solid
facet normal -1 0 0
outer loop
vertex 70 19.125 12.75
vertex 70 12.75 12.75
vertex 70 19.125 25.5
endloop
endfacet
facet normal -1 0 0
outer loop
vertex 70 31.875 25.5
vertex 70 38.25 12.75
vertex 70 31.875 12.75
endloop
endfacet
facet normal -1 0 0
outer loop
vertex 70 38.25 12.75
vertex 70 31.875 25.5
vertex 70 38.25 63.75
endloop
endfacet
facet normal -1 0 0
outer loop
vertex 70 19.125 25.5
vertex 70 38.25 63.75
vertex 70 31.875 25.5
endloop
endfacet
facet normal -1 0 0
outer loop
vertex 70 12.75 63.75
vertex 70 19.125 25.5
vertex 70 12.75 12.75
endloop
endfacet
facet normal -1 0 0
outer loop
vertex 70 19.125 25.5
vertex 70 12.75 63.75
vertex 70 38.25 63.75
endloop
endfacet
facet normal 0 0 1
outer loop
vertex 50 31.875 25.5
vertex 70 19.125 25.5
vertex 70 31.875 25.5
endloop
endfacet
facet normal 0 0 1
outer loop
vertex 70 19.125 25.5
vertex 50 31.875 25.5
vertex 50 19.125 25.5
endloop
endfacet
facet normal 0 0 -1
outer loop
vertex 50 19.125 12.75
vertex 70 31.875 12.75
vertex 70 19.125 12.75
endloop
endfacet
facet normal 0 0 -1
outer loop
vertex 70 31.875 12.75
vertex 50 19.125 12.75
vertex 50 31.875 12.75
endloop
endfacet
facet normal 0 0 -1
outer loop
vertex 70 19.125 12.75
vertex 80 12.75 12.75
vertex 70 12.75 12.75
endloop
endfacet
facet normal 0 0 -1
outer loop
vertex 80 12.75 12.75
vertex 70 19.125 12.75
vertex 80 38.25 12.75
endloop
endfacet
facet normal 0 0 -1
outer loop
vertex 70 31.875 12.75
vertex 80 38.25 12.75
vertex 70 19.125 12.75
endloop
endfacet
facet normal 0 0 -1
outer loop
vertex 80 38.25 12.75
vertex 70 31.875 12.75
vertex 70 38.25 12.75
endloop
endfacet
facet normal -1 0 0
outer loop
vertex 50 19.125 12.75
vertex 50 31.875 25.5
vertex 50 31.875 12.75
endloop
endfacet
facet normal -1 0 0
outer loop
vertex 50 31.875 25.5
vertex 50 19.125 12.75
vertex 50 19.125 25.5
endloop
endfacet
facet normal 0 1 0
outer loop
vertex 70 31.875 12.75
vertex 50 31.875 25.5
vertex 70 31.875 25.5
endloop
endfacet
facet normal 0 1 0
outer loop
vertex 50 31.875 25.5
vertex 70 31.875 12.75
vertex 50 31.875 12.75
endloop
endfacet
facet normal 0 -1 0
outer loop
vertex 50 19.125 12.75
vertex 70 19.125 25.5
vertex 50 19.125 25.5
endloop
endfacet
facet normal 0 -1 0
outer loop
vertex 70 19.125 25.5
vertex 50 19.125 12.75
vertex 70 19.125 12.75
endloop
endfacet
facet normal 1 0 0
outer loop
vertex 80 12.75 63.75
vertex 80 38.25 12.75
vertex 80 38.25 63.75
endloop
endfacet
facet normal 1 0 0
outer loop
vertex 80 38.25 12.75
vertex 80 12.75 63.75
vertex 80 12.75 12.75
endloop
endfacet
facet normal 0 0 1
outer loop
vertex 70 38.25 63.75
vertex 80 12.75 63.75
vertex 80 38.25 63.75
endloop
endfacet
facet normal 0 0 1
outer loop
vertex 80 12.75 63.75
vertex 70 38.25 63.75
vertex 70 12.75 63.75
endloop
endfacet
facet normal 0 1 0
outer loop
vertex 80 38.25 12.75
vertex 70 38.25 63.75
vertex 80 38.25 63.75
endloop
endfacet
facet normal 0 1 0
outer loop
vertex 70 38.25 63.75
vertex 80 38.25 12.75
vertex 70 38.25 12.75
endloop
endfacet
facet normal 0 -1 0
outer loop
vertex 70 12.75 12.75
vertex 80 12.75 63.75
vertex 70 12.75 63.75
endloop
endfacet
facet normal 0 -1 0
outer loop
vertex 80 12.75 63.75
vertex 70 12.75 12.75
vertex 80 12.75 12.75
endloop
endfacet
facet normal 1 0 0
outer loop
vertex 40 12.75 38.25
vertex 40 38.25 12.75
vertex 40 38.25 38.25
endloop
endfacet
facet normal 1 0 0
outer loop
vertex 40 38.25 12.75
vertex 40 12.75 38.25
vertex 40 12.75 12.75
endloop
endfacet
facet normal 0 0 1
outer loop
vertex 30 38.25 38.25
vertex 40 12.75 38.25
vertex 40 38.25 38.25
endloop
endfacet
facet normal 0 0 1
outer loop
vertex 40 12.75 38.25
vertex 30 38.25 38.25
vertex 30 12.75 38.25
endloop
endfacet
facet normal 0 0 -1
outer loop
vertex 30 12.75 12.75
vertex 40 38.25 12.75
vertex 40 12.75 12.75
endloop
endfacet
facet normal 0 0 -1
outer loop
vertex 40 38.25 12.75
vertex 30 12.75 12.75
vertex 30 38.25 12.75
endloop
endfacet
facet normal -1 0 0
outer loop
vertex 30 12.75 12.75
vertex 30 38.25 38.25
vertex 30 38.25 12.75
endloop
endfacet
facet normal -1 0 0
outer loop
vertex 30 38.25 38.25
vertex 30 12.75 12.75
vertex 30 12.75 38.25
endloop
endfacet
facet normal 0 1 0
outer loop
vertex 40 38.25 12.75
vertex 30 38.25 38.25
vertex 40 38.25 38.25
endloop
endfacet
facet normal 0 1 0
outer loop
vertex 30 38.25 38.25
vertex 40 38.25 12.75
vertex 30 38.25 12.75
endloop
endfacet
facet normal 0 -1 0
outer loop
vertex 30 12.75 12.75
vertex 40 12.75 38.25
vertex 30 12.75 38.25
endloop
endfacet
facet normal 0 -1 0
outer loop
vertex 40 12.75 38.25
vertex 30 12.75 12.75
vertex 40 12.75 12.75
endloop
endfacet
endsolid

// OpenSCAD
module lock(wn,w,d,s){//d and h make square
    union(){
    difference(){
        cube([w,d,d]);
        union(){//arm insert
        translate([0,d/4-s,d/4-s]) cube([wn,d/2+2*s,d/2+2*s]);
        translate([wn,d/4-8-s,d/4-8-s]) cube([10+s,d/2+16+2*s,d/2+16+2*s]);
        translate([wn+10,d/4-8-s,d/4-8-s]) cube([10+s,d/2+16+2*s,d+8+s]);
        translate([0,d/4-s,d/4-s]) cube([wn+20,d/2+2*s,d+s]);
        }
        union(){
            translate([wn+20,d/4-s,d/4-s]) cube([10+s,d/2+2*s,d/2+s]);
            translate([wn+30,3/8*d-s,2/8*d-s]) cube([10+s,d/4+2*s,d/4+2*s]);  
            translate([wn+40,d/4-s,d/4-s]) cube([20+s,d/2+2*s,3/4*d+s]);
        }
    }
    translate([wn+60,d/2, d/2]) rotate([0,90,0])cylinder(r=3.5, h=2);
    }
}
    


module key(wn,w,d,s){
   union(){//arm insert
       translate([-4,d/4,d/4]) cube([4,d/2,d/2]);
       translate([0,d/4,d/4]) cube([wn,d/2,d/2]);
       translate([wn,d/4-8,d/4-8]) cube([10,d/2+16,d/2+16]);
   } 
}



module tumbler(wn,w,d,s){
    union(){
            translate([wn+10,d/4,d/4]) cube([10,d/2,d/2]);
            translate([wn+20,3/8*d,2/8*d]) cube([20,d/4,d/4]);  
            translate([wn+40,d/4,d/4]) cube([10,d/2,d]);
        }
}

module model(wn,w,d,s){
    key(wn,w,d,s);
    tumbler(wn,w,d,s);
    lock(wn,w,d,s);
}

printTumbler(30,100,51,1.5);

//printTumbler(30,100,51,1.5);
module printTumbler(wn,w,d,s){
    union(){
         translate([wn+20,3/8*d,2/8*d]) cube([20,d/4,d/4]);  
         translate([wn+40,d/4,d/4]) cube([10,d/2,d]);
    }
    translate([-10,0,0]) translate([wn+10,d/4,d/4]) cube([10,d/2,d/2]);
}

//cut to print
